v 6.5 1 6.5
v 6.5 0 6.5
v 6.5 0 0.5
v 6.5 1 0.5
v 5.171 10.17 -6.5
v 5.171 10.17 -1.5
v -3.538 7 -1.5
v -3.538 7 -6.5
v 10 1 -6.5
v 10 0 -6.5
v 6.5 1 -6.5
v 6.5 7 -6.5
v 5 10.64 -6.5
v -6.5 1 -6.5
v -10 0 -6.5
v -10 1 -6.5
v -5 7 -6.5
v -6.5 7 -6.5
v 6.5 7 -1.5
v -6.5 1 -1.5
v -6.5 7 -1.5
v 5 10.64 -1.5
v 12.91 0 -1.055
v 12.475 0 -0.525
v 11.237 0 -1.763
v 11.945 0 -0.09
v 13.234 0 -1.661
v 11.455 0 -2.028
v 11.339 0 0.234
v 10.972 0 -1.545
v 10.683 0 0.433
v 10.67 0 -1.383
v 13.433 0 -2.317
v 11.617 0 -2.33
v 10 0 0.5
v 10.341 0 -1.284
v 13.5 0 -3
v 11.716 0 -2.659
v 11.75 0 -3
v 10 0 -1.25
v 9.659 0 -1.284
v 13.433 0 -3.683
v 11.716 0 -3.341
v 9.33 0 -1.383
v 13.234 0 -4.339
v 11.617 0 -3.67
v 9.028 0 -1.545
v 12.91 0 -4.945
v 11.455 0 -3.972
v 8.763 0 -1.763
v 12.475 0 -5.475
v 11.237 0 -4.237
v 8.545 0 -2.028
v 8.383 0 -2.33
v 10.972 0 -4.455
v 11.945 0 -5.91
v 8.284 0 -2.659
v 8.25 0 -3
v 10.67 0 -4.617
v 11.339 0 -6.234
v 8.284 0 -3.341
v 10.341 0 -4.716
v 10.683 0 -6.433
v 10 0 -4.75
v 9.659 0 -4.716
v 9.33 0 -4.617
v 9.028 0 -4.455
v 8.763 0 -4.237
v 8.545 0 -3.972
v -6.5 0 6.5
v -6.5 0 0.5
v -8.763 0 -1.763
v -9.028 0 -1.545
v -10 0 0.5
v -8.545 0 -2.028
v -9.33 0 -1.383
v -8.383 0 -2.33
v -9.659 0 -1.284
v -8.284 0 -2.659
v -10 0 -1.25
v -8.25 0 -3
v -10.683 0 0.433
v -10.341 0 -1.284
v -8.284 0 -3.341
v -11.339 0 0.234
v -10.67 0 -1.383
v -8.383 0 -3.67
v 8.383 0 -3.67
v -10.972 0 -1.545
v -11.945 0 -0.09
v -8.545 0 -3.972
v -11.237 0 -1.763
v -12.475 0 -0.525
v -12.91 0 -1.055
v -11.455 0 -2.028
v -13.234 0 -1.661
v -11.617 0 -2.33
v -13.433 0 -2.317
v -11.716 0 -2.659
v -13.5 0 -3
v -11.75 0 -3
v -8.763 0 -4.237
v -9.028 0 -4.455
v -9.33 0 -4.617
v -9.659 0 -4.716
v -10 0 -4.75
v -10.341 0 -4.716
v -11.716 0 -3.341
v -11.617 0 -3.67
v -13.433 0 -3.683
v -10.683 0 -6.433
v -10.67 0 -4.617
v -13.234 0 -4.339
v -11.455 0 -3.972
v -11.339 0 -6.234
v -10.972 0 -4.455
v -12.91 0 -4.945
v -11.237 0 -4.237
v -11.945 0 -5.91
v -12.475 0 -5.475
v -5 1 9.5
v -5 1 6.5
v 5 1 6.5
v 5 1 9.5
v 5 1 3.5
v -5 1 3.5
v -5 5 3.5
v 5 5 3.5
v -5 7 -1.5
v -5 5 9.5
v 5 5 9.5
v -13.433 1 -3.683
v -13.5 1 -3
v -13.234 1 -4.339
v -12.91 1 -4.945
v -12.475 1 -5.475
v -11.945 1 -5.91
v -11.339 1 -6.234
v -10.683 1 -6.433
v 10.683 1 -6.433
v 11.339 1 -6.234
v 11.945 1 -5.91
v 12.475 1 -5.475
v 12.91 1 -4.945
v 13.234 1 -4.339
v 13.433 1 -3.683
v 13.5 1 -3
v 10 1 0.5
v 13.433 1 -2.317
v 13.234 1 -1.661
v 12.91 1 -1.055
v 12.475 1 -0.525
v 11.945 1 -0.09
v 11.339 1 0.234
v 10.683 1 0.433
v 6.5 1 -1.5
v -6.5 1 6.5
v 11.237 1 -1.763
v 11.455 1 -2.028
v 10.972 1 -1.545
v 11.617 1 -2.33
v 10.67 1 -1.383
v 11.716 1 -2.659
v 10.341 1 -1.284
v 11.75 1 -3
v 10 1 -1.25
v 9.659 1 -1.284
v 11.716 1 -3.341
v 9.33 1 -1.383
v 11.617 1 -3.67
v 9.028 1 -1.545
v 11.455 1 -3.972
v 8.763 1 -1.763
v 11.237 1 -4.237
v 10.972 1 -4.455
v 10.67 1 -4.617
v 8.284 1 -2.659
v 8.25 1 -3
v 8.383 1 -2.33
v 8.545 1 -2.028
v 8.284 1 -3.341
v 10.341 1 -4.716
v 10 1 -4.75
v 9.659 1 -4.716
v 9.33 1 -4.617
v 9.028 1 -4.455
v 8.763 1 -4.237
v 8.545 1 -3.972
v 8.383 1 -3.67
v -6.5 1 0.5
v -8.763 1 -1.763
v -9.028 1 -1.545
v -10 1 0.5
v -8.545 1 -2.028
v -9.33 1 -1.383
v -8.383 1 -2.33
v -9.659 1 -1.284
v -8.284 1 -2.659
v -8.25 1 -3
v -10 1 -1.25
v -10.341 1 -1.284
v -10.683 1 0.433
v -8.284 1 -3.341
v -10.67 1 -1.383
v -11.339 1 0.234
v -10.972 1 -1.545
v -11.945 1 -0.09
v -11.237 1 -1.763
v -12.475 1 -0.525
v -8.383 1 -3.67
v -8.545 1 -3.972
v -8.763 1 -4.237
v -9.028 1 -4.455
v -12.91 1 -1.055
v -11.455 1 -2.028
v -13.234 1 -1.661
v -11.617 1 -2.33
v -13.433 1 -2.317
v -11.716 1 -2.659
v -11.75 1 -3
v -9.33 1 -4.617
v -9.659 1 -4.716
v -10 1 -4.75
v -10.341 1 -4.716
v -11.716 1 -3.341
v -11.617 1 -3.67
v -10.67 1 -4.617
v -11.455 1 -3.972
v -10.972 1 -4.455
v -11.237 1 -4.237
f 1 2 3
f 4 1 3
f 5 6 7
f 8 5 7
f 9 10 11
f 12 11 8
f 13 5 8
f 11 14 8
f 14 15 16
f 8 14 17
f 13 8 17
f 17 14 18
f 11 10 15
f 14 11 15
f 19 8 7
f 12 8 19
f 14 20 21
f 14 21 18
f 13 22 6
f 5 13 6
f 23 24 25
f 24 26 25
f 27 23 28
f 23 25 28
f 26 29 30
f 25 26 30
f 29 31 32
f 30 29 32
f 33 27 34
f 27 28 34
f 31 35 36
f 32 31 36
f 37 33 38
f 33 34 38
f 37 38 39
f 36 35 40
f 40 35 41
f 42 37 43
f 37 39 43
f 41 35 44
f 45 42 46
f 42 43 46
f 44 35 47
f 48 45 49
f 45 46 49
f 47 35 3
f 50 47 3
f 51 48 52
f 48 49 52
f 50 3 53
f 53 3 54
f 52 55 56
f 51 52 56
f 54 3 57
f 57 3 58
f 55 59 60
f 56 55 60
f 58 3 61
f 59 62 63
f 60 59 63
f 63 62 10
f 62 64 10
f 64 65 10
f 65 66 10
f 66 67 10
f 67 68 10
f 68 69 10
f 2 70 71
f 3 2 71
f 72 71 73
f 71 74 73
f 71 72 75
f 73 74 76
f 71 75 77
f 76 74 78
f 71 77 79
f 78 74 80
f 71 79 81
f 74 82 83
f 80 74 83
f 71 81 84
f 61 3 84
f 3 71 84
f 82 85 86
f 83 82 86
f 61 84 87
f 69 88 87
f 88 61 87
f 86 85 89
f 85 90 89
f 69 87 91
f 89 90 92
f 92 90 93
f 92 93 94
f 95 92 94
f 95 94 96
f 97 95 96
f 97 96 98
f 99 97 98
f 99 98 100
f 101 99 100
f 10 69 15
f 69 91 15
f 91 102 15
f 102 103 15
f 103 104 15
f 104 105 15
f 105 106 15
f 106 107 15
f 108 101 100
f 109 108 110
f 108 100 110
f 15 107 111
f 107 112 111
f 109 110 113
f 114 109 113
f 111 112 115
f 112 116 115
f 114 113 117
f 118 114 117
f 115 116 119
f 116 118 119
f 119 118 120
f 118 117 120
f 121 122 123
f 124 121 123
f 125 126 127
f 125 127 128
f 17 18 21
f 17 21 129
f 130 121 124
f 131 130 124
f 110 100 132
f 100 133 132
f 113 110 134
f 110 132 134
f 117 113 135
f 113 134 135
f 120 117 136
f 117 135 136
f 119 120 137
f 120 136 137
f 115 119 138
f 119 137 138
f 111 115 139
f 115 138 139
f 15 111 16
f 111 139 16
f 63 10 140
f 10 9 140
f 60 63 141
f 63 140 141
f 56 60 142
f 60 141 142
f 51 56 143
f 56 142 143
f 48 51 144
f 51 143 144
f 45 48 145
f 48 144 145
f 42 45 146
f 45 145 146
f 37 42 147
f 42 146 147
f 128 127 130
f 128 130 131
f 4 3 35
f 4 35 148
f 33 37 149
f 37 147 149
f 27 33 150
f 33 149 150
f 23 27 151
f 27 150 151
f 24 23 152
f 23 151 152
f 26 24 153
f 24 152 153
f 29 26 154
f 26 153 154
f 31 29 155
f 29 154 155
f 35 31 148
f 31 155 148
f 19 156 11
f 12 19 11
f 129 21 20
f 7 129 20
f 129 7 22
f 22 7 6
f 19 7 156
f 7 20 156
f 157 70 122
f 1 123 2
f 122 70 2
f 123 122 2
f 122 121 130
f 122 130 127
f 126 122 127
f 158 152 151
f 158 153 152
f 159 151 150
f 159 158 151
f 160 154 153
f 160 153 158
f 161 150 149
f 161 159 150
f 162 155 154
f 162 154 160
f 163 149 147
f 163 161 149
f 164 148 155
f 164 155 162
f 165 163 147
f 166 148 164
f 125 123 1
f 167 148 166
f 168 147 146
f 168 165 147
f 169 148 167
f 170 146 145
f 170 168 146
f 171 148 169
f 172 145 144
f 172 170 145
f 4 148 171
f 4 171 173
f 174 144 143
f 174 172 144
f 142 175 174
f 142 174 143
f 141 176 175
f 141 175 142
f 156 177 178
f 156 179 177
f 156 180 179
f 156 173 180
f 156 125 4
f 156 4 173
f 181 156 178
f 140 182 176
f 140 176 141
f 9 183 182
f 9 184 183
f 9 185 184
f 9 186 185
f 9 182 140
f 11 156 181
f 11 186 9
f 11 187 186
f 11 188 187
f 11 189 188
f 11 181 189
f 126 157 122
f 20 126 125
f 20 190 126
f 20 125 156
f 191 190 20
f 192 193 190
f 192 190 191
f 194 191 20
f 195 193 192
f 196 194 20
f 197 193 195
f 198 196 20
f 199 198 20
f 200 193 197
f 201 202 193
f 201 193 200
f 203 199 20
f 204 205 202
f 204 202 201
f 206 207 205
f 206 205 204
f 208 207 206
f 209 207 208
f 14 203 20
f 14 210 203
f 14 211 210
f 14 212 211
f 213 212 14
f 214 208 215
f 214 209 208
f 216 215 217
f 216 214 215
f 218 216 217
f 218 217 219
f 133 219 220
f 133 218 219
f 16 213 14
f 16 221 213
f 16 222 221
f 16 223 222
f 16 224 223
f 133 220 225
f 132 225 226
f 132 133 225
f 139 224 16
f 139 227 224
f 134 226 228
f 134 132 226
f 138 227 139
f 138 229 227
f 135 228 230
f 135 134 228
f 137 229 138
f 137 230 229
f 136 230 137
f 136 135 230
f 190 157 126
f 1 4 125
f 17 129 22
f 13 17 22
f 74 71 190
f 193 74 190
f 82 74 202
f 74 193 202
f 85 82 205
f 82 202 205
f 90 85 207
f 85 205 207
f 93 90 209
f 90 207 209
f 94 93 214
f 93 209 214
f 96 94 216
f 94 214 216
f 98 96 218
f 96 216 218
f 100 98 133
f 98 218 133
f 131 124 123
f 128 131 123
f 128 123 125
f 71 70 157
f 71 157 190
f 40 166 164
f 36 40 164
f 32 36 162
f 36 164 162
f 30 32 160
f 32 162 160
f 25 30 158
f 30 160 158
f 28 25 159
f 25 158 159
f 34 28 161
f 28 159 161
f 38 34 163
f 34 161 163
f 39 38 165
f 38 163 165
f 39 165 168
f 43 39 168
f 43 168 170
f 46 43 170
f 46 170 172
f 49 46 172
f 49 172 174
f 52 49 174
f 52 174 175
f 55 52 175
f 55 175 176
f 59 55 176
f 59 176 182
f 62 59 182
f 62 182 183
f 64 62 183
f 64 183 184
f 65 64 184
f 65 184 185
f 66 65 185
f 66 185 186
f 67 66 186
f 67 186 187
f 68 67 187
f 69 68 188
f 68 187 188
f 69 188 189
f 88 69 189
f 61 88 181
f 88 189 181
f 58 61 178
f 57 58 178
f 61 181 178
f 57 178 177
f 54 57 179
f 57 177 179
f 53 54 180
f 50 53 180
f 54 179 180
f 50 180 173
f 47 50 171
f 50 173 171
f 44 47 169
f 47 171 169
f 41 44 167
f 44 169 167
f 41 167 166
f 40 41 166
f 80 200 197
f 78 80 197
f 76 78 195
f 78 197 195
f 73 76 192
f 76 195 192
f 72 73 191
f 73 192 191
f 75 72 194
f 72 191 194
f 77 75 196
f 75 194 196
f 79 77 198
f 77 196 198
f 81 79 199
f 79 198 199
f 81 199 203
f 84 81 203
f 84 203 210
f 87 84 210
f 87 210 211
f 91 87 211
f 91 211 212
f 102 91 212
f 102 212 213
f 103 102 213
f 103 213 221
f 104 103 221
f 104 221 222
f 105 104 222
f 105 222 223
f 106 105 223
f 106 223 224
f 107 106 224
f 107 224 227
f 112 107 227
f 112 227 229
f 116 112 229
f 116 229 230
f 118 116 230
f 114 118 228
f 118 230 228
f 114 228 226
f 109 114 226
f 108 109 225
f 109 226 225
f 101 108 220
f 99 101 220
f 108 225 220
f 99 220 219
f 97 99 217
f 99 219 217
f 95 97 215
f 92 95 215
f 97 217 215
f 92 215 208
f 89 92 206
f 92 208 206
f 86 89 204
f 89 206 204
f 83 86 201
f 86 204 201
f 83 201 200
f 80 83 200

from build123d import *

# Parameters (mm, degrees)
SKETCH1_W           = 13
SKETCH1_H           = 13
BOSS_EXTRUDE1_DEPTH = 1
SKETCH4_W           = 7
SKETCH4_H           = 1
BOSS_EXTRUDE2_DEPTH = 7
SKETCH5_W           = 7
SKETCH5_H           = 1
BOSS_EXTRUDE3_DEPTH = 7
SKETCH6_R           = 1.75
CUT_EXTRUDE1_DEPTH  = 16.016657418
SKETCH7_W           = 10
SKETCH7_H           = 6
BOSS_EXTRUDE4_DEPTH = 4
SKETCH8_W           = 13
SKETCH8_H           = 5
BOSS_EXTRUDE5_DEPTH = 6
BOSS_EXTRUDE6_DEPTH = 5
FILLET1_R           = 3.5


with BuildPart() as part:
    # Sketch1 → Boss-Extrude1 (new body)
    with BuildSketch(Plane(origin=(0, 0, 0), x_dir=(1, 0, 0), z_dir=(0, 1, 0))):
        Rectangle(SKETCH1_W, SKETCH1_H)
    extrude(amount=BOSS_EXTRUDE1_DEPTH)

    # Sketch4 → Boss-Extrude2 (add)
    with BuildSketch(Plane.ZY.offset(6.5)):
        with Locations((-3, 0.5)):
            Rectangle(SKETCH4_W, SKETCH4_H)
    extrude(amount=BOSS_EXTRUDE2_DEPTH)

    # Sketch5 → Boss-Extrude3 (add)
    with BuildSketch(Plane(origin=(6.5, 0, 0), x_dir=(0, 0, -1), z_dir=(1, 0, 0))):
        with Locations((3, 0.5)):
            Rectangle(SKETCH5_W, SKETCH5_H)
    extrude(amount=BOSS_EXTRUDE3_DEPTH)

    # Sketch6 → Cut-Extrude1 (cut, through all)
    with BuildSketch(Plane(origin=(0, 1, 0), x_dir=(1, 0, 0), z_dir=(0, 1, 0))):
        with Locations(Location((-10, 3, 0), (0, 0, 270))):
            Circle(SKETCH6_R)
        with Locations(Location((10, 3, 0), (0, 0, 270))):
            Circle(SKETCH6_R)
    extrude(amount=-CUT_EXTRUDE1_DEPTH, mode=Mode.SUBTRACT)

    # Sketch7 → Boss-Extrude4 (add)
    with BuildSketch(Plane(origin=(0, 1, 0), x_dir=(1, 0, 0), z_dir=(0, 1, 0))):
        with Locations((0, -6.5)):
            Rectangle(SKETCH7_W, SKETCH7_H)
    extrude(amount=BOSS_EXTRUDE4_DEPTH)

    # Sketch8 → Boss-Extrude5 (add)
    with BuildSketch(Plane(origin=(0, 1, 0), x_dir=(1, 0, 0), z_dir=(0, 1, 0))):
        with Locations((0, 4)):
            Rectangle(SKETCH8_W, SKETCH8_H)
    extrude(amount=BOSS_EXTRUDE5_DEPTH)

    # Sketch9 → Boss-Extrude6 (add)
    with BuildSketch(Plane.XY.offset(-1.5)):
        Polygon((-5, 7), (5, 10.639702343), (5.171010072, 10.169856032), (-3.5380978, 7), align=None)
    extrude(amount=-BOSS_EXTRUDE6_DEPTH)

    # Fillet1
    fillet1_edges = [part.edges().sort_by_distance(p)[0] for p in [
        (13.5, 0.5, -6.5),
        (13.5, 0.5, 0.5),
        (-13.5, 0.5, -6.5),
        (-13.5, 0.5, 0.5),
    ]]
    fillet(fillet1_edges, radius=FILLET1_R - 0.0001)  # a hair under: the kernel refuses the full size


solid = part.part
